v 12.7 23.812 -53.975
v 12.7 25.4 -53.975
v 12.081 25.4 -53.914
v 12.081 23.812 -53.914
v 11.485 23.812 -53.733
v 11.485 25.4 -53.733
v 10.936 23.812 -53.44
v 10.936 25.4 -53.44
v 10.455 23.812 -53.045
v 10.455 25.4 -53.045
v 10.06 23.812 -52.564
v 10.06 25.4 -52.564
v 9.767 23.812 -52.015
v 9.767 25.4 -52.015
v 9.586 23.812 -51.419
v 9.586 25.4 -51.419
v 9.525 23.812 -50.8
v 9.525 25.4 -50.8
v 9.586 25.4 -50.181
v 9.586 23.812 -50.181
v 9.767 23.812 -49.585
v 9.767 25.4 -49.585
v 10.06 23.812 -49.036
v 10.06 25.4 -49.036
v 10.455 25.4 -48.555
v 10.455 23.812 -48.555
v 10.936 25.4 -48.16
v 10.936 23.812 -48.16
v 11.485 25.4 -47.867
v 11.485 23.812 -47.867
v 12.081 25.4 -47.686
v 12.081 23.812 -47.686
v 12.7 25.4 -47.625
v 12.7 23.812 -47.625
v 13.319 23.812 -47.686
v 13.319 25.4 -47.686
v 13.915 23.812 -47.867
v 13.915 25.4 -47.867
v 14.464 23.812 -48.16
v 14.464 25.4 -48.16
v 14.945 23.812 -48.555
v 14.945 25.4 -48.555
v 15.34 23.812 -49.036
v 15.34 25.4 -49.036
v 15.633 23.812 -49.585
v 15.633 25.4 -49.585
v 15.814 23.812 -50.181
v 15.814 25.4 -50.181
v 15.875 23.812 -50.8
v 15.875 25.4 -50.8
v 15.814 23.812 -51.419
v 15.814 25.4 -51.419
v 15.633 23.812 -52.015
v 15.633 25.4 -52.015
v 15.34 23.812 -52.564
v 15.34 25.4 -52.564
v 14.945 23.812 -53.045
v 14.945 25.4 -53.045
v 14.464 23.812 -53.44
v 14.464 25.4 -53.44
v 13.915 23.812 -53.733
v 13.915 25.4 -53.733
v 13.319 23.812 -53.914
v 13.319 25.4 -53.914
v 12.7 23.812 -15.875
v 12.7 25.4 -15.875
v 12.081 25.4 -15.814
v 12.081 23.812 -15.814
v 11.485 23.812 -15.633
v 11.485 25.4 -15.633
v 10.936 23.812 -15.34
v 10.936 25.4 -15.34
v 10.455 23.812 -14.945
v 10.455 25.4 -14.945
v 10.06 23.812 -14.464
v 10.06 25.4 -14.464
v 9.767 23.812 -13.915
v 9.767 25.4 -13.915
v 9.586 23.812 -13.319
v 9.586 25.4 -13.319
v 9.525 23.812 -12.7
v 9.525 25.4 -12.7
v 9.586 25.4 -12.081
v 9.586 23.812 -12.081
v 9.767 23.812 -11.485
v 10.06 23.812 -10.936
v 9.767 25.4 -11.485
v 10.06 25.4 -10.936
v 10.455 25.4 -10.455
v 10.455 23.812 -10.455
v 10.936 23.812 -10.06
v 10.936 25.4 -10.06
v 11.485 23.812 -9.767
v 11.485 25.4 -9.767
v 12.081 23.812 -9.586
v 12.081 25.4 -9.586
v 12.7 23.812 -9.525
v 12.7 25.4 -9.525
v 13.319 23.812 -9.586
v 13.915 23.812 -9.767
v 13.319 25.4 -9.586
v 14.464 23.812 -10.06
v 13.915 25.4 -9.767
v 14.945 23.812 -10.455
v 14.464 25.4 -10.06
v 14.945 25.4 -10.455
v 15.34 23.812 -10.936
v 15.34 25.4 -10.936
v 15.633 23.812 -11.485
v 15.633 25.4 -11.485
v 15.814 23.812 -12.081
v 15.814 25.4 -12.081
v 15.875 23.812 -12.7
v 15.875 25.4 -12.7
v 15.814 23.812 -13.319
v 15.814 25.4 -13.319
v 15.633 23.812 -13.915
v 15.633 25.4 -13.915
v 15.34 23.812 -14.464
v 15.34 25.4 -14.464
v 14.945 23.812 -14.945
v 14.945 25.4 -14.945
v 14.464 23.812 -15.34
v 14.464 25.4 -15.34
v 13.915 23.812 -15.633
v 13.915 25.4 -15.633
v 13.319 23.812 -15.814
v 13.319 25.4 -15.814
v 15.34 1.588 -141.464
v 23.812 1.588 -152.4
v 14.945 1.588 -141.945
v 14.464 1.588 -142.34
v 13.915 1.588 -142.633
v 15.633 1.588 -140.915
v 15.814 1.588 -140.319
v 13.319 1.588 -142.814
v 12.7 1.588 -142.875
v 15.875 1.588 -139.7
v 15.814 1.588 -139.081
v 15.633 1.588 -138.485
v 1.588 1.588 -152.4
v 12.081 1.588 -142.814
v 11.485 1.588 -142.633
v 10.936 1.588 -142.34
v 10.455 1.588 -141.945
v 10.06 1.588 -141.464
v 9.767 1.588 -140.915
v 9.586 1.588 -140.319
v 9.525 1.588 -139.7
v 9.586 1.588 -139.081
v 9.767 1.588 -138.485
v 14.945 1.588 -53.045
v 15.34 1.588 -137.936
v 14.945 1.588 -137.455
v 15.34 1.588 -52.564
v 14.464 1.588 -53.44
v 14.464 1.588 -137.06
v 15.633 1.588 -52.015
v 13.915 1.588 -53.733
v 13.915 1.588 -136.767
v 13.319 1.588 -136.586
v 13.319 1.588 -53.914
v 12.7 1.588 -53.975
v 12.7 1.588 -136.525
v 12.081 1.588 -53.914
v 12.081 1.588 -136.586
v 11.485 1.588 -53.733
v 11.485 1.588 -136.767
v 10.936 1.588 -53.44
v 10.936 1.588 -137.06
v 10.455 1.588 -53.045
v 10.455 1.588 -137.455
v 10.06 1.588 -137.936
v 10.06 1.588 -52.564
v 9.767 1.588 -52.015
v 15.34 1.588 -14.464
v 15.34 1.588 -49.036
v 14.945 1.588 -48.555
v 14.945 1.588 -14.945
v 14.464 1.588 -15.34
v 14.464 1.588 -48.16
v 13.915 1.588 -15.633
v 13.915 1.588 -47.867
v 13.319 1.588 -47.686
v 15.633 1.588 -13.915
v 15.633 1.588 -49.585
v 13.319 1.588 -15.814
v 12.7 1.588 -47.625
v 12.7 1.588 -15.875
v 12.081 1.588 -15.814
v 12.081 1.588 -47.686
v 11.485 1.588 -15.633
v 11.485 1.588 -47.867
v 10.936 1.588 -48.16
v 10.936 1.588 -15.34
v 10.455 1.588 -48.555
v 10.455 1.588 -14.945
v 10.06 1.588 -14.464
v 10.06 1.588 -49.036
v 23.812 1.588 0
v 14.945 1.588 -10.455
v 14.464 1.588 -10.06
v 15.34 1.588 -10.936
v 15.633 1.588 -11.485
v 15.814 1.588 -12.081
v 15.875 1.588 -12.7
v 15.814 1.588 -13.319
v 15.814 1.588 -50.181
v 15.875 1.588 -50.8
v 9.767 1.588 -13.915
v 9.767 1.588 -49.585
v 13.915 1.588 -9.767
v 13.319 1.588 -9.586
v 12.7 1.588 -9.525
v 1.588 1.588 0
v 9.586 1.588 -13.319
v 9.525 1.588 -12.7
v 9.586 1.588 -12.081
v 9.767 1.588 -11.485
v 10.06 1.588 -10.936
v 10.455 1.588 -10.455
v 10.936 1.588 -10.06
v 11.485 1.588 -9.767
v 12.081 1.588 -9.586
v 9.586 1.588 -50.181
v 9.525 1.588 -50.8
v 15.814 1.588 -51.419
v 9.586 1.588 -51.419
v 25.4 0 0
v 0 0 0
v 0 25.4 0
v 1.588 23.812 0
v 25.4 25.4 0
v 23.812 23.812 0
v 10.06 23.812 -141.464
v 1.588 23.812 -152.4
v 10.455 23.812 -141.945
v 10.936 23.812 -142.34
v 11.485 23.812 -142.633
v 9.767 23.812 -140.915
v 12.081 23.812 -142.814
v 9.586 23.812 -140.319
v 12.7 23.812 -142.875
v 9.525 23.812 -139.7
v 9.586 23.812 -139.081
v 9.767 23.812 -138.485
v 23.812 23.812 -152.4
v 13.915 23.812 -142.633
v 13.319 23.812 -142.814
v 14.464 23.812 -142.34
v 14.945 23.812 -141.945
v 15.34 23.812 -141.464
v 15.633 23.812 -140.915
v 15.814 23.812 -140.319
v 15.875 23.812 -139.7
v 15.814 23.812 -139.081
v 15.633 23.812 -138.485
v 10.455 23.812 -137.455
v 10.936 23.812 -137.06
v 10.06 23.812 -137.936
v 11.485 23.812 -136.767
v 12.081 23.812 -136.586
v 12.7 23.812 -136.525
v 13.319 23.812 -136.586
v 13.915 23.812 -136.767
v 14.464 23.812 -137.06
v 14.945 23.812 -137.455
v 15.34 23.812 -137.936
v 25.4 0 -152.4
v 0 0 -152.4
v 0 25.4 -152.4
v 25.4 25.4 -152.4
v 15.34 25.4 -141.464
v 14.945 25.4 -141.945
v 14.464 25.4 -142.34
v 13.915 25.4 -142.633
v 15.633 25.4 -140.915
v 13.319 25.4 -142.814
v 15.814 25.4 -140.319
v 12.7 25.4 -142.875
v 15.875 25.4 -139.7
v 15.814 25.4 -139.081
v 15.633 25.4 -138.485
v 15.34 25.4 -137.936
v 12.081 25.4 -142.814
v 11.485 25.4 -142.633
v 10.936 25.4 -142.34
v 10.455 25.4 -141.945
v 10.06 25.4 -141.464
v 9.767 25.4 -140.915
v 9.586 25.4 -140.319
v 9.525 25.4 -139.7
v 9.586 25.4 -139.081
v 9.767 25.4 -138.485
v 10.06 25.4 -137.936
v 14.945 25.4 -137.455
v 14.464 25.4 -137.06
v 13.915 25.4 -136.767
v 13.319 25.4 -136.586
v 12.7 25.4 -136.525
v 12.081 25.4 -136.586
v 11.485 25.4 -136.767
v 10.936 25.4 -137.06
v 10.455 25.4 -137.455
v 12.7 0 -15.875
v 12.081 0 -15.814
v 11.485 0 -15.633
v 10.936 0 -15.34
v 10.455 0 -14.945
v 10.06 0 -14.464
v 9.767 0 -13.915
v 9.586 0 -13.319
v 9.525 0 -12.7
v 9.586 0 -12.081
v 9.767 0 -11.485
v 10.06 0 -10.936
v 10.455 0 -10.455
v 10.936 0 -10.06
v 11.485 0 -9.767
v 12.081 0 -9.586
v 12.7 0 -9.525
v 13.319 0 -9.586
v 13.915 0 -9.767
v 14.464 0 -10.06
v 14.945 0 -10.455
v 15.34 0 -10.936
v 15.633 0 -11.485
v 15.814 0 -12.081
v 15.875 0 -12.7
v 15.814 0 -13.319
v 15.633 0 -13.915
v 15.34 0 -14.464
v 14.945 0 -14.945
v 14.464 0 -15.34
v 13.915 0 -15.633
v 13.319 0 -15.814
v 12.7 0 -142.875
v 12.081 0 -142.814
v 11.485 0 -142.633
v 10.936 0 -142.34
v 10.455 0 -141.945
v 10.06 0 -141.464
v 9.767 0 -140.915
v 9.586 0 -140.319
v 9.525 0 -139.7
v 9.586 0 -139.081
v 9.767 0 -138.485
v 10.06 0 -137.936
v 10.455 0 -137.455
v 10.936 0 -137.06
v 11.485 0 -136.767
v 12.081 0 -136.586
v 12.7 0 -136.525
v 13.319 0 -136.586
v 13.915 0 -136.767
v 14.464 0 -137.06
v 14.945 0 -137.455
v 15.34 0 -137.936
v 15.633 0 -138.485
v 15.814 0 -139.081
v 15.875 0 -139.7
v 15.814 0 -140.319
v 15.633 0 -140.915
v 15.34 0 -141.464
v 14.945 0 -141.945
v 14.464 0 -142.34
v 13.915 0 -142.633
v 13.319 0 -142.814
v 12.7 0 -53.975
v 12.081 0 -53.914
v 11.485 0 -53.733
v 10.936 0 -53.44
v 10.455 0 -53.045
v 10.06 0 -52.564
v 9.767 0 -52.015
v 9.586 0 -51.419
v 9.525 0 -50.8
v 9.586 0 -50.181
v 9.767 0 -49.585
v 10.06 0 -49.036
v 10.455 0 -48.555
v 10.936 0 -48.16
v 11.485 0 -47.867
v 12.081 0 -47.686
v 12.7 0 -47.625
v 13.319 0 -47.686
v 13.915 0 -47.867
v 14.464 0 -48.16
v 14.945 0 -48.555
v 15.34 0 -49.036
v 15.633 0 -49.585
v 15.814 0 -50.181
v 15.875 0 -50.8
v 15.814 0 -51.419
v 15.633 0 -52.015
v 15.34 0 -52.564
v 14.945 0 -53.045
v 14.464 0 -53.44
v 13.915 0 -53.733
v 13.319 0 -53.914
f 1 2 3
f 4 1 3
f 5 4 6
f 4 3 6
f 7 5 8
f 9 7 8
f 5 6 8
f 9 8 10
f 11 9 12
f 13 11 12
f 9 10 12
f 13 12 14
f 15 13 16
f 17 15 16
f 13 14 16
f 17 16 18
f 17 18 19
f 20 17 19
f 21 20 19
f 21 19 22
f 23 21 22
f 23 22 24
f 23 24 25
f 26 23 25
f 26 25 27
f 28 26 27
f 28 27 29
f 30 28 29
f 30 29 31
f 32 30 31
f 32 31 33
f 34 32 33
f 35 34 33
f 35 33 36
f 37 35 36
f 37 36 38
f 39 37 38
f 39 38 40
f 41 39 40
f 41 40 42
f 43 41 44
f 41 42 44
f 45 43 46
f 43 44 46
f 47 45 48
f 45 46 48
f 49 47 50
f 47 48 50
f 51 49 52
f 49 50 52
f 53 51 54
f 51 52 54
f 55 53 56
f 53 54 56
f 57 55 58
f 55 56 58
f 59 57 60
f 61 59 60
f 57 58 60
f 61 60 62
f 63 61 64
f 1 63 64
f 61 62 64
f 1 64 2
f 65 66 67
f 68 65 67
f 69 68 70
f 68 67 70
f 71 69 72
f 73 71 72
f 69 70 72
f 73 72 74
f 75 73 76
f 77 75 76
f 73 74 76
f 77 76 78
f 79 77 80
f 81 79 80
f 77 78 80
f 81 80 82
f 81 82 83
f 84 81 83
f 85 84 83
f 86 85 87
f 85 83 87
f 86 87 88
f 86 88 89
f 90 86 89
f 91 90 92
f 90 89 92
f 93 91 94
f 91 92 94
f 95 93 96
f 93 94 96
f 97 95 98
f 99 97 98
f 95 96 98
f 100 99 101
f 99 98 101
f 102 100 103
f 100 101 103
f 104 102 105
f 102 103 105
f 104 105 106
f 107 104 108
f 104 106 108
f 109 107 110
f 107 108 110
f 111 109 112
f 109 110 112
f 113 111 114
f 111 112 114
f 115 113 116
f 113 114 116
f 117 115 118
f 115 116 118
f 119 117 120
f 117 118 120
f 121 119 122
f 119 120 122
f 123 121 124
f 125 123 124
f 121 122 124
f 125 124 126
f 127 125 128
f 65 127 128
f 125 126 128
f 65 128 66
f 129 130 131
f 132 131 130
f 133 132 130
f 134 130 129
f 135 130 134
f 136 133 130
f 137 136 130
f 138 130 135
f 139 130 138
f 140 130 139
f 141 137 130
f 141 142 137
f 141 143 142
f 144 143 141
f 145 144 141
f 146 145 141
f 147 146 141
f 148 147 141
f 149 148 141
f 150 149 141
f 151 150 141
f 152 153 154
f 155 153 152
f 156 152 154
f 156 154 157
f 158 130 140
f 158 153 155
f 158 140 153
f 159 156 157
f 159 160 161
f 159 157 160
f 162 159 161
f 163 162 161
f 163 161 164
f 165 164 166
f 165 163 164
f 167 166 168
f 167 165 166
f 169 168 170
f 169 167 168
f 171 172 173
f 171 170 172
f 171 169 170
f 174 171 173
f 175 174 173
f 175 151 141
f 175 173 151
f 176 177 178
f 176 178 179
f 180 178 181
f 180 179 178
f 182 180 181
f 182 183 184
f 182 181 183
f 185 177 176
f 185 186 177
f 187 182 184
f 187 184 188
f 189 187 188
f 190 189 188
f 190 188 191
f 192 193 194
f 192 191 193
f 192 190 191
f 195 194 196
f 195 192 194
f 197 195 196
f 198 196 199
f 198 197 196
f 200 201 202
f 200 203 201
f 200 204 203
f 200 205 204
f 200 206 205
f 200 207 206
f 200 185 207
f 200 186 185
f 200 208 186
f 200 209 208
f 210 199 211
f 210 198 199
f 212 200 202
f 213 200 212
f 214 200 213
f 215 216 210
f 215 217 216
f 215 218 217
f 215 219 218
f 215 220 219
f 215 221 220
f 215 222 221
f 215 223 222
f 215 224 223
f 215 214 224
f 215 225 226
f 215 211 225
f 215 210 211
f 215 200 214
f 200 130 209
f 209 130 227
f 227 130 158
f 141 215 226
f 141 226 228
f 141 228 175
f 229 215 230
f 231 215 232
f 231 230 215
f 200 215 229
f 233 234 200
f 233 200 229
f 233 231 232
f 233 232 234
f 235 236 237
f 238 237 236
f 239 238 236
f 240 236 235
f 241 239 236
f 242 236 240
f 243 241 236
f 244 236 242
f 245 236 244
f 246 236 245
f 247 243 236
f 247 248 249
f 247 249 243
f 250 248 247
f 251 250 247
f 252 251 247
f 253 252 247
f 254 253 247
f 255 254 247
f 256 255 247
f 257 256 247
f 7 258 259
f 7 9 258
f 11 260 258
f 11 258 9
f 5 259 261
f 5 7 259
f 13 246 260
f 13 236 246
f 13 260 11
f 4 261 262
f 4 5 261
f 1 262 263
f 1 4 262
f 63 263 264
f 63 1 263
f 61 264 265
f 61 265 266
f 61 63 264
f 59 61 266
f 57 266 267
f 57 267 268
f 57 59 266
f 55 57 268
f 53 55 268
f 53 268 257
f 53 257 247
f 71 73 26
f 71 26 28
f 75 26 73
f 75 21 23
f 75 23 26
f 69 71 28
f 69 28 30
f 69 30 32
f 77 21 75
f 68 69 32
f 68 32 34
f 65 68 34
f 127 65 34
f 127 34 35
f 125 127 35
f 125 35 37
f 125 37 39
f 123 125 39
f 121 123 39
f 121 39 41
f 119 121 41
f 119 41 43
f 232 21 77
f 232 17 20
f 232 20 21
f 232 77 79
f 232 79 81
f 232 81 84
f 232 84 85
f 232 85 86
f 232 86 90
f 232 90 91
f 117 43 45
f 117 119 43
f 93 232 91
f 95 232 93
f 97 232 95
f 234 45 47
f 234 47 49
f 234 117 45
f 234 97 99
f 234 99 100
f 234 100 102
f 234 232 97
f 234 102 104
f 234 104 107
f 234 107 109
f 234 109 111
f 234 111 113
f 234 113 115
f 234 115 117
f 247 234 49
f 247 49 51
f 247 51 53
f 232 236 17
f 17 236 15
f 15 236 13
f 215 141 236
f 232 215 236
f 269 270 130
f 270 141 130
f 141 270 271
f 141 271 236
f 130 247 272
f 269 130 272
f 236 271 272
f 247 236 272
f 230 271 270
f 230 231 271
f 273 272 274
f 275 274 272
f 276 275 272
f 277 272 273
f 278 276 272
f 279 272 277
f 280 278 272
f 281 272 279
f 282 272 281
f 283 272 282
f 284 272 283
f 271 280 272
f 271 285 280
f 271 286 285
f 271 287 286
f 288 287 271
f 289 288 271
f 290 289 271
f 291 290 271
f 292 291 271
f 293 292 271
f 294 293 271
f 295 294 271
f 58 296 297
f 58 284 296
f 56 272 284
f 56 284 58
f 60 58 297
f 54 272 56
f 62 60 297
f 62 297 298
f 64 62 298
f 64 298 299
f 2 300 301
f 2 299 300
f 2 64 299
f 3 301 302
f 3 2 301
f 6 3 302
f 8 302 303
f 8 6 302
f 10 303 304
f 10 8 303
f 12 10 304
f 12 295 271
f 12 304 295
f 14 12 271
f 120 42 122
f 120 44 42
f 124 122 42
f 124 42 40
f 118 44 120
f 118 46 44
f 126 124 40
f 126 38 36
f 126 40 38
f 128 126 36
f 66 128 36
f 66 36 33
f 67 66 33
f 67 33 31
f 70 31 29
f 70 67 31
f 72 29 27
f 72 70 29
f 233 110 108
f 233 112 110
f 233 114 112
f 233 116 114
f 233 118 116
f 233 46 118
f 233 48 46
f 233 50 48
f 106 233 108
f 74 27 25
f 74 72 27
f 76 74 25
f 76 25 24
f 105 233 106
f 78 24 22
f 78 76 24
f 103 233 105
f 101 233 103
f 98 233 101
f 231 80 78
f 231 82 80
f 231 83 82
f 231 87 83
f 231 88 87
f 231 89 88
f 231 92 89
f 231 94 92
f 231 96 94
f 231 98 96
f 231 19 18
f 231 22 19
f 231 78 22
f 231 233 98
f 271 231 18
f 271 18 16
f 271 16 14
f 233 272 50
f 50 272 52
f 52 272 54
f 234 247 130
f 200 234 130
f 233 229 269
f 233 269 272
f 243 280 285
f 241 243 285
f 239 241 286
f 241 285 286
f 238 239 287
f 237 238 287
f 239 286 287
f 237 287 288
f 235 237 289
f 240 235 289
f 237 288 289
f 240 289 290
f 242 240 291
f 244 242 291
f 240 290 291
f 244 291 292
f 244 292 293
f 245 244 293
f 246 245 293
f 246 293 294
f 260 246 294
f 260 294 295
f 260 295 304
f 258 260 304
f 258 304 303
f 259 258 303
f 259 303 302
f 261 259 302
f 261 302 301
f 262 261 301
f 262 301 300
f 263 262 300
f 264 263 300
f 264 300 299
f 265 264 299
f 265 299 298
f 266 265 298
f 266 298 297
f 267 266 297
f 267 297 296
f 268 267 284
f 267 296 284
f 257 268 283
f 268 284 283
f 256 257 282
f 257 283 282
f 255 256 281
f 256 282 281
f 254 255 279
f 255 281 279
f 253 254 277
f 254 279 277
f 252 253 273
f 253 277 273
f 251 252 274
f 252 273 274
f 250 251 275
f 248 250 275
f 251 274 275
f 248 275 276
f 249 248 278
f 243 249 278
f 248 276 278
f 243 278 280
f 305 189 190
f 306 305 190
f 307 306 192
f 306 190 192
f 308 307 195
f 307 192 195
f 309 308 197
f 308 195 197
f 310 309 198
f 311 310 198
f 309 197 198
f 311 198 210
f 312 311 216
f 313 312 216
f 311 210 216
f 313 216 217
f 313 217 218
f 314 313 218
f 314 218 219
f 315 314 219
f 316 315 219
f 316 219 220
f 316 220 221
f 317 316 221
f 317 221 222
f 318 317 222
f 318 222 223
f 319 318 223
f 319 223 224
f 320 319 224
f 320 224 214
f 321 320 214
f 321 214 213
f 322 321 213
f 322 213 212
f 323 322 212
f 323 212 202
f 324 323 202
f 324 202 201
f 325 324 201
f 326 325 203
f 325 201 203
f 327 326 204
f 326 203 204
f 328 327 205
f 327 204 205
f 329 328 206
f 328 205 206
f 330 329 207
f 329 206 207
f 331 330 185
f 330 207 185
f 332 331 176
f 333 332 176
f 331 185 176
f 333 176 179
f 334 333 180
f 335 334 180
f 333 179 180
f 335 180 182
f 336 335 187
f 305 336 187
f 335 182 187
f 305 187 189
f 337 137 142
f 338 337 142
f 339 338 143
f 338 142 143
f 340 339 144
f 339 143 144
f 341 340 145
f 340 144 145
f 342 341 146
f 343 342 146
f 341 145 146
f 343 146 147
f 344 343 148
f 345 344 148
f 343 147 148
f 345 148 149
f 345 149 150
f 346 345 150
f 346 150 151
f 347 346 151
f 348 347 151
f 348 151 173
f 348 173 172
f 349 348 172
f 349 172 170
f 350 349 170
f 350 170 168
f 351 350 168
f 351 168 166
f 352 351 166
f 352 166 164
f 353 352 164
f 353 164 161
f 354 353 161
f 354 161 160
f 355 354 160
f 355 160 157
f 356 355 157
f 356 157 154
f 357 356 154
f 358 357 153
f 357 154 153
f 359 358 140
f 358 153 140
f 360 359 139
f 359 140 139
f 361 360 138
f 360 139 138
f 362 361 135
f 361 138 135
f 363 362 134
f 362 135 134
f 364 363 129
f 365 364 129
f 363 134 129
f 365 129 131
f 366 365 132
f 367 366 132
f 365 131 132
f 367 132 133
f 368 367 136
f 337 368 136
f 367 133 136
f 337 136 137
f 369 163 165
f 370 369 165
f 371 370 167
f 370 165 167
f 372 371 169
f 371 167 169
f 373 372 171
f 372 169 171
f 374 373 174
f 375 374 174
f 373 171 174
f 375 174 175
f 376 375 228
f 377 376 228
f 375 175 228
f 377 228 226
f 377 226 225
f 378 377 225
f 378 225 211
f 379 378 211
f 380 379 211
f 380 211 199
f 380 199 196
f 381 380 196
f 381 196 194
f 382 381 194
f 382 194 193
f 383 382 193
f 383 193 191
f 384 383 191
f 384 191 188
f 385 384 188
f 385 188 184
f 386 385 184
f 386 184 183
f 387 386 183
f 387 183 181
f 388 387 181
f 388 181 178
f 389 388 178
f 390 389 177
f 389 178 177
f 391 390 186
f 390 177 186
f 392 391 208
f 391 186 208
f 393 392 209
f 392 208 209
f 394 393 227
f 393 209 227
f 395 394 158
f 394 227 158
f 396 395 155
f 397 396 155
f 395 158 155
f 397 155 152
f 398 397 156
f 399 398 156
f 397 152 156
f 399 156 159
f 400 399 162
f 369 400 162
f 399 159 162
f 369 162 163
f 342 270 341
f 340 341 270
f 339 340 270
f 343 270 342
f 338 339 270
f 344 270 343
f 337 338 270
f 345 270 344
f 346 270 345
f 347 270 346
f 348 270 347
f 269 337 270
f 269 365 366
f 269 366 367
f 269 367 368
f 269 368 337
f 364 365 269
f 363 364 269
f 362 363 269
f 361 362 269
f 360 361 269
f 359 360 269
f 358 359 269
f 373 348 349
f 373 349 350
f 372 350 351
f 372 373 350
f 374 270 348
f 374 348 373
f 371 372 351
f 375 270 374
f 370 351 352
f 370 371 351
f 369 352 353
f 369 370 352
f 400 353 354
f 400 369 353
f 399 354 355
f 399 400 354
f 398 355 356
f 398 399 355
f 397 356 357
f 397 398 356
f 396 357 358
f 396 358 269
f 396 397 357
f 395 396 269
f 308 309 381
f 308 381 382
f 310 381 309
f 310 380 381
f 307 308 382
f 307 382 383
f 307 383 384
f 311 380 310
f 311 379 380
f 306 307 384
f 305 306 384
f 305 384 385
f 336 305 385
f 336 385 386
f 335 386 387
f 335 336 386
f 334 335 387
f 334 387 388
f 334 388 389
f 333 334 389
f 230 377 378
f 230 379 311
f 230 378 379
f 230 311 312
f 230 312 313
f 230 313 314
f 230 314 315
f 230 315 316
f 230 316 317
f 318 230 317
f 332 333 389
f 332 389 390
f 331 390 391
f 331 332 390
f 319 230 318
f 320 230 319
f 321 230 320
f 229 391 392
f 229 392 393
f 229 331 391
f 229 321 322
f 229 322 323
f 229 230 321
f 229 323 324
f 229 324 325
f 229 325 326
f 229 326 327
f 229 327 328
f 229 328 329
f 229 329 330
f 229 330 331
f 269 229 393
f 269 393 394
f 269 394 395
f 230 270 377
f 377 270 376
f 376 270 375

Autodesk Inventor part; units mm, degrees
ref_plane "YZ Plane" through (0, 0, 0) normal (1, 0, 0) x (0, 1, 0)
ref_plane "XZ Plane" through (0, 0, 0) normal (0, 1, 0) x (-1, 0, 0)
ref_plane "XY Plane" through (0, 0, 0) normal (0, 0, 1) x (1, 0, 0)
sketch "Sketch1" plane through (0, 0, 0) normal (0, 0, 1) x (1, 0, 0)
  line L0 (0, 0) -> (25.4, 0)
  line L1 (25.4, 0) -> (25.4, 25.4)
  line L2 (25.4, 25.4) -> (0, 25.4)
  line L3 (0, 25.4) -> (0, 0)
  line L4 (1.5875, 23.8125) -> (23.8125, 23.8125)
  line L5 (23.8125, 23.8125) -> (23.8125, 1.5875)
  line L6 (23.8125, 1.5875) -> (1.5875, 1.5875)
  line L7 (1.5875, 1.5875) -> (1.5875, 23.8125)
  dimension "d0" = 25.4
  dimension "d1" = 25.4
  dimension "d2" = 1.5875
extrude "Extrusion1" add sketch "Sketch1" against normal blind 152.4
sketch "Sketch3" plane through (0, 0, 0) normal (0, -1, 0) x (1, 0, 0)
  line L0 (0, -152.4) -> (25.4, -152.4) projected
  line L1 (0, 0) -> (25.4, 0) projected
  line L2 (25.4, 0) -> (25.4, -152.4) projected
  point P0 (12.7, -12.7)
  point P1 (12.7, -139.7)
  point P2 (12.7, -50.8)
  dimension "d7" = 12.7
  dimension "d8" = 12.7
  dimension "d23" = 38.1
  dimension "d24" = 12.7
hole "Hole2" at (12.7, 0, -12.7) at (12.7, 0, -139.7) at (12.7, 0, -50.8) direction (0, 1, 0) diameter 6.35 depth 25.4 tip angle 118
properties part number "tube_f_l_out_wheel"
